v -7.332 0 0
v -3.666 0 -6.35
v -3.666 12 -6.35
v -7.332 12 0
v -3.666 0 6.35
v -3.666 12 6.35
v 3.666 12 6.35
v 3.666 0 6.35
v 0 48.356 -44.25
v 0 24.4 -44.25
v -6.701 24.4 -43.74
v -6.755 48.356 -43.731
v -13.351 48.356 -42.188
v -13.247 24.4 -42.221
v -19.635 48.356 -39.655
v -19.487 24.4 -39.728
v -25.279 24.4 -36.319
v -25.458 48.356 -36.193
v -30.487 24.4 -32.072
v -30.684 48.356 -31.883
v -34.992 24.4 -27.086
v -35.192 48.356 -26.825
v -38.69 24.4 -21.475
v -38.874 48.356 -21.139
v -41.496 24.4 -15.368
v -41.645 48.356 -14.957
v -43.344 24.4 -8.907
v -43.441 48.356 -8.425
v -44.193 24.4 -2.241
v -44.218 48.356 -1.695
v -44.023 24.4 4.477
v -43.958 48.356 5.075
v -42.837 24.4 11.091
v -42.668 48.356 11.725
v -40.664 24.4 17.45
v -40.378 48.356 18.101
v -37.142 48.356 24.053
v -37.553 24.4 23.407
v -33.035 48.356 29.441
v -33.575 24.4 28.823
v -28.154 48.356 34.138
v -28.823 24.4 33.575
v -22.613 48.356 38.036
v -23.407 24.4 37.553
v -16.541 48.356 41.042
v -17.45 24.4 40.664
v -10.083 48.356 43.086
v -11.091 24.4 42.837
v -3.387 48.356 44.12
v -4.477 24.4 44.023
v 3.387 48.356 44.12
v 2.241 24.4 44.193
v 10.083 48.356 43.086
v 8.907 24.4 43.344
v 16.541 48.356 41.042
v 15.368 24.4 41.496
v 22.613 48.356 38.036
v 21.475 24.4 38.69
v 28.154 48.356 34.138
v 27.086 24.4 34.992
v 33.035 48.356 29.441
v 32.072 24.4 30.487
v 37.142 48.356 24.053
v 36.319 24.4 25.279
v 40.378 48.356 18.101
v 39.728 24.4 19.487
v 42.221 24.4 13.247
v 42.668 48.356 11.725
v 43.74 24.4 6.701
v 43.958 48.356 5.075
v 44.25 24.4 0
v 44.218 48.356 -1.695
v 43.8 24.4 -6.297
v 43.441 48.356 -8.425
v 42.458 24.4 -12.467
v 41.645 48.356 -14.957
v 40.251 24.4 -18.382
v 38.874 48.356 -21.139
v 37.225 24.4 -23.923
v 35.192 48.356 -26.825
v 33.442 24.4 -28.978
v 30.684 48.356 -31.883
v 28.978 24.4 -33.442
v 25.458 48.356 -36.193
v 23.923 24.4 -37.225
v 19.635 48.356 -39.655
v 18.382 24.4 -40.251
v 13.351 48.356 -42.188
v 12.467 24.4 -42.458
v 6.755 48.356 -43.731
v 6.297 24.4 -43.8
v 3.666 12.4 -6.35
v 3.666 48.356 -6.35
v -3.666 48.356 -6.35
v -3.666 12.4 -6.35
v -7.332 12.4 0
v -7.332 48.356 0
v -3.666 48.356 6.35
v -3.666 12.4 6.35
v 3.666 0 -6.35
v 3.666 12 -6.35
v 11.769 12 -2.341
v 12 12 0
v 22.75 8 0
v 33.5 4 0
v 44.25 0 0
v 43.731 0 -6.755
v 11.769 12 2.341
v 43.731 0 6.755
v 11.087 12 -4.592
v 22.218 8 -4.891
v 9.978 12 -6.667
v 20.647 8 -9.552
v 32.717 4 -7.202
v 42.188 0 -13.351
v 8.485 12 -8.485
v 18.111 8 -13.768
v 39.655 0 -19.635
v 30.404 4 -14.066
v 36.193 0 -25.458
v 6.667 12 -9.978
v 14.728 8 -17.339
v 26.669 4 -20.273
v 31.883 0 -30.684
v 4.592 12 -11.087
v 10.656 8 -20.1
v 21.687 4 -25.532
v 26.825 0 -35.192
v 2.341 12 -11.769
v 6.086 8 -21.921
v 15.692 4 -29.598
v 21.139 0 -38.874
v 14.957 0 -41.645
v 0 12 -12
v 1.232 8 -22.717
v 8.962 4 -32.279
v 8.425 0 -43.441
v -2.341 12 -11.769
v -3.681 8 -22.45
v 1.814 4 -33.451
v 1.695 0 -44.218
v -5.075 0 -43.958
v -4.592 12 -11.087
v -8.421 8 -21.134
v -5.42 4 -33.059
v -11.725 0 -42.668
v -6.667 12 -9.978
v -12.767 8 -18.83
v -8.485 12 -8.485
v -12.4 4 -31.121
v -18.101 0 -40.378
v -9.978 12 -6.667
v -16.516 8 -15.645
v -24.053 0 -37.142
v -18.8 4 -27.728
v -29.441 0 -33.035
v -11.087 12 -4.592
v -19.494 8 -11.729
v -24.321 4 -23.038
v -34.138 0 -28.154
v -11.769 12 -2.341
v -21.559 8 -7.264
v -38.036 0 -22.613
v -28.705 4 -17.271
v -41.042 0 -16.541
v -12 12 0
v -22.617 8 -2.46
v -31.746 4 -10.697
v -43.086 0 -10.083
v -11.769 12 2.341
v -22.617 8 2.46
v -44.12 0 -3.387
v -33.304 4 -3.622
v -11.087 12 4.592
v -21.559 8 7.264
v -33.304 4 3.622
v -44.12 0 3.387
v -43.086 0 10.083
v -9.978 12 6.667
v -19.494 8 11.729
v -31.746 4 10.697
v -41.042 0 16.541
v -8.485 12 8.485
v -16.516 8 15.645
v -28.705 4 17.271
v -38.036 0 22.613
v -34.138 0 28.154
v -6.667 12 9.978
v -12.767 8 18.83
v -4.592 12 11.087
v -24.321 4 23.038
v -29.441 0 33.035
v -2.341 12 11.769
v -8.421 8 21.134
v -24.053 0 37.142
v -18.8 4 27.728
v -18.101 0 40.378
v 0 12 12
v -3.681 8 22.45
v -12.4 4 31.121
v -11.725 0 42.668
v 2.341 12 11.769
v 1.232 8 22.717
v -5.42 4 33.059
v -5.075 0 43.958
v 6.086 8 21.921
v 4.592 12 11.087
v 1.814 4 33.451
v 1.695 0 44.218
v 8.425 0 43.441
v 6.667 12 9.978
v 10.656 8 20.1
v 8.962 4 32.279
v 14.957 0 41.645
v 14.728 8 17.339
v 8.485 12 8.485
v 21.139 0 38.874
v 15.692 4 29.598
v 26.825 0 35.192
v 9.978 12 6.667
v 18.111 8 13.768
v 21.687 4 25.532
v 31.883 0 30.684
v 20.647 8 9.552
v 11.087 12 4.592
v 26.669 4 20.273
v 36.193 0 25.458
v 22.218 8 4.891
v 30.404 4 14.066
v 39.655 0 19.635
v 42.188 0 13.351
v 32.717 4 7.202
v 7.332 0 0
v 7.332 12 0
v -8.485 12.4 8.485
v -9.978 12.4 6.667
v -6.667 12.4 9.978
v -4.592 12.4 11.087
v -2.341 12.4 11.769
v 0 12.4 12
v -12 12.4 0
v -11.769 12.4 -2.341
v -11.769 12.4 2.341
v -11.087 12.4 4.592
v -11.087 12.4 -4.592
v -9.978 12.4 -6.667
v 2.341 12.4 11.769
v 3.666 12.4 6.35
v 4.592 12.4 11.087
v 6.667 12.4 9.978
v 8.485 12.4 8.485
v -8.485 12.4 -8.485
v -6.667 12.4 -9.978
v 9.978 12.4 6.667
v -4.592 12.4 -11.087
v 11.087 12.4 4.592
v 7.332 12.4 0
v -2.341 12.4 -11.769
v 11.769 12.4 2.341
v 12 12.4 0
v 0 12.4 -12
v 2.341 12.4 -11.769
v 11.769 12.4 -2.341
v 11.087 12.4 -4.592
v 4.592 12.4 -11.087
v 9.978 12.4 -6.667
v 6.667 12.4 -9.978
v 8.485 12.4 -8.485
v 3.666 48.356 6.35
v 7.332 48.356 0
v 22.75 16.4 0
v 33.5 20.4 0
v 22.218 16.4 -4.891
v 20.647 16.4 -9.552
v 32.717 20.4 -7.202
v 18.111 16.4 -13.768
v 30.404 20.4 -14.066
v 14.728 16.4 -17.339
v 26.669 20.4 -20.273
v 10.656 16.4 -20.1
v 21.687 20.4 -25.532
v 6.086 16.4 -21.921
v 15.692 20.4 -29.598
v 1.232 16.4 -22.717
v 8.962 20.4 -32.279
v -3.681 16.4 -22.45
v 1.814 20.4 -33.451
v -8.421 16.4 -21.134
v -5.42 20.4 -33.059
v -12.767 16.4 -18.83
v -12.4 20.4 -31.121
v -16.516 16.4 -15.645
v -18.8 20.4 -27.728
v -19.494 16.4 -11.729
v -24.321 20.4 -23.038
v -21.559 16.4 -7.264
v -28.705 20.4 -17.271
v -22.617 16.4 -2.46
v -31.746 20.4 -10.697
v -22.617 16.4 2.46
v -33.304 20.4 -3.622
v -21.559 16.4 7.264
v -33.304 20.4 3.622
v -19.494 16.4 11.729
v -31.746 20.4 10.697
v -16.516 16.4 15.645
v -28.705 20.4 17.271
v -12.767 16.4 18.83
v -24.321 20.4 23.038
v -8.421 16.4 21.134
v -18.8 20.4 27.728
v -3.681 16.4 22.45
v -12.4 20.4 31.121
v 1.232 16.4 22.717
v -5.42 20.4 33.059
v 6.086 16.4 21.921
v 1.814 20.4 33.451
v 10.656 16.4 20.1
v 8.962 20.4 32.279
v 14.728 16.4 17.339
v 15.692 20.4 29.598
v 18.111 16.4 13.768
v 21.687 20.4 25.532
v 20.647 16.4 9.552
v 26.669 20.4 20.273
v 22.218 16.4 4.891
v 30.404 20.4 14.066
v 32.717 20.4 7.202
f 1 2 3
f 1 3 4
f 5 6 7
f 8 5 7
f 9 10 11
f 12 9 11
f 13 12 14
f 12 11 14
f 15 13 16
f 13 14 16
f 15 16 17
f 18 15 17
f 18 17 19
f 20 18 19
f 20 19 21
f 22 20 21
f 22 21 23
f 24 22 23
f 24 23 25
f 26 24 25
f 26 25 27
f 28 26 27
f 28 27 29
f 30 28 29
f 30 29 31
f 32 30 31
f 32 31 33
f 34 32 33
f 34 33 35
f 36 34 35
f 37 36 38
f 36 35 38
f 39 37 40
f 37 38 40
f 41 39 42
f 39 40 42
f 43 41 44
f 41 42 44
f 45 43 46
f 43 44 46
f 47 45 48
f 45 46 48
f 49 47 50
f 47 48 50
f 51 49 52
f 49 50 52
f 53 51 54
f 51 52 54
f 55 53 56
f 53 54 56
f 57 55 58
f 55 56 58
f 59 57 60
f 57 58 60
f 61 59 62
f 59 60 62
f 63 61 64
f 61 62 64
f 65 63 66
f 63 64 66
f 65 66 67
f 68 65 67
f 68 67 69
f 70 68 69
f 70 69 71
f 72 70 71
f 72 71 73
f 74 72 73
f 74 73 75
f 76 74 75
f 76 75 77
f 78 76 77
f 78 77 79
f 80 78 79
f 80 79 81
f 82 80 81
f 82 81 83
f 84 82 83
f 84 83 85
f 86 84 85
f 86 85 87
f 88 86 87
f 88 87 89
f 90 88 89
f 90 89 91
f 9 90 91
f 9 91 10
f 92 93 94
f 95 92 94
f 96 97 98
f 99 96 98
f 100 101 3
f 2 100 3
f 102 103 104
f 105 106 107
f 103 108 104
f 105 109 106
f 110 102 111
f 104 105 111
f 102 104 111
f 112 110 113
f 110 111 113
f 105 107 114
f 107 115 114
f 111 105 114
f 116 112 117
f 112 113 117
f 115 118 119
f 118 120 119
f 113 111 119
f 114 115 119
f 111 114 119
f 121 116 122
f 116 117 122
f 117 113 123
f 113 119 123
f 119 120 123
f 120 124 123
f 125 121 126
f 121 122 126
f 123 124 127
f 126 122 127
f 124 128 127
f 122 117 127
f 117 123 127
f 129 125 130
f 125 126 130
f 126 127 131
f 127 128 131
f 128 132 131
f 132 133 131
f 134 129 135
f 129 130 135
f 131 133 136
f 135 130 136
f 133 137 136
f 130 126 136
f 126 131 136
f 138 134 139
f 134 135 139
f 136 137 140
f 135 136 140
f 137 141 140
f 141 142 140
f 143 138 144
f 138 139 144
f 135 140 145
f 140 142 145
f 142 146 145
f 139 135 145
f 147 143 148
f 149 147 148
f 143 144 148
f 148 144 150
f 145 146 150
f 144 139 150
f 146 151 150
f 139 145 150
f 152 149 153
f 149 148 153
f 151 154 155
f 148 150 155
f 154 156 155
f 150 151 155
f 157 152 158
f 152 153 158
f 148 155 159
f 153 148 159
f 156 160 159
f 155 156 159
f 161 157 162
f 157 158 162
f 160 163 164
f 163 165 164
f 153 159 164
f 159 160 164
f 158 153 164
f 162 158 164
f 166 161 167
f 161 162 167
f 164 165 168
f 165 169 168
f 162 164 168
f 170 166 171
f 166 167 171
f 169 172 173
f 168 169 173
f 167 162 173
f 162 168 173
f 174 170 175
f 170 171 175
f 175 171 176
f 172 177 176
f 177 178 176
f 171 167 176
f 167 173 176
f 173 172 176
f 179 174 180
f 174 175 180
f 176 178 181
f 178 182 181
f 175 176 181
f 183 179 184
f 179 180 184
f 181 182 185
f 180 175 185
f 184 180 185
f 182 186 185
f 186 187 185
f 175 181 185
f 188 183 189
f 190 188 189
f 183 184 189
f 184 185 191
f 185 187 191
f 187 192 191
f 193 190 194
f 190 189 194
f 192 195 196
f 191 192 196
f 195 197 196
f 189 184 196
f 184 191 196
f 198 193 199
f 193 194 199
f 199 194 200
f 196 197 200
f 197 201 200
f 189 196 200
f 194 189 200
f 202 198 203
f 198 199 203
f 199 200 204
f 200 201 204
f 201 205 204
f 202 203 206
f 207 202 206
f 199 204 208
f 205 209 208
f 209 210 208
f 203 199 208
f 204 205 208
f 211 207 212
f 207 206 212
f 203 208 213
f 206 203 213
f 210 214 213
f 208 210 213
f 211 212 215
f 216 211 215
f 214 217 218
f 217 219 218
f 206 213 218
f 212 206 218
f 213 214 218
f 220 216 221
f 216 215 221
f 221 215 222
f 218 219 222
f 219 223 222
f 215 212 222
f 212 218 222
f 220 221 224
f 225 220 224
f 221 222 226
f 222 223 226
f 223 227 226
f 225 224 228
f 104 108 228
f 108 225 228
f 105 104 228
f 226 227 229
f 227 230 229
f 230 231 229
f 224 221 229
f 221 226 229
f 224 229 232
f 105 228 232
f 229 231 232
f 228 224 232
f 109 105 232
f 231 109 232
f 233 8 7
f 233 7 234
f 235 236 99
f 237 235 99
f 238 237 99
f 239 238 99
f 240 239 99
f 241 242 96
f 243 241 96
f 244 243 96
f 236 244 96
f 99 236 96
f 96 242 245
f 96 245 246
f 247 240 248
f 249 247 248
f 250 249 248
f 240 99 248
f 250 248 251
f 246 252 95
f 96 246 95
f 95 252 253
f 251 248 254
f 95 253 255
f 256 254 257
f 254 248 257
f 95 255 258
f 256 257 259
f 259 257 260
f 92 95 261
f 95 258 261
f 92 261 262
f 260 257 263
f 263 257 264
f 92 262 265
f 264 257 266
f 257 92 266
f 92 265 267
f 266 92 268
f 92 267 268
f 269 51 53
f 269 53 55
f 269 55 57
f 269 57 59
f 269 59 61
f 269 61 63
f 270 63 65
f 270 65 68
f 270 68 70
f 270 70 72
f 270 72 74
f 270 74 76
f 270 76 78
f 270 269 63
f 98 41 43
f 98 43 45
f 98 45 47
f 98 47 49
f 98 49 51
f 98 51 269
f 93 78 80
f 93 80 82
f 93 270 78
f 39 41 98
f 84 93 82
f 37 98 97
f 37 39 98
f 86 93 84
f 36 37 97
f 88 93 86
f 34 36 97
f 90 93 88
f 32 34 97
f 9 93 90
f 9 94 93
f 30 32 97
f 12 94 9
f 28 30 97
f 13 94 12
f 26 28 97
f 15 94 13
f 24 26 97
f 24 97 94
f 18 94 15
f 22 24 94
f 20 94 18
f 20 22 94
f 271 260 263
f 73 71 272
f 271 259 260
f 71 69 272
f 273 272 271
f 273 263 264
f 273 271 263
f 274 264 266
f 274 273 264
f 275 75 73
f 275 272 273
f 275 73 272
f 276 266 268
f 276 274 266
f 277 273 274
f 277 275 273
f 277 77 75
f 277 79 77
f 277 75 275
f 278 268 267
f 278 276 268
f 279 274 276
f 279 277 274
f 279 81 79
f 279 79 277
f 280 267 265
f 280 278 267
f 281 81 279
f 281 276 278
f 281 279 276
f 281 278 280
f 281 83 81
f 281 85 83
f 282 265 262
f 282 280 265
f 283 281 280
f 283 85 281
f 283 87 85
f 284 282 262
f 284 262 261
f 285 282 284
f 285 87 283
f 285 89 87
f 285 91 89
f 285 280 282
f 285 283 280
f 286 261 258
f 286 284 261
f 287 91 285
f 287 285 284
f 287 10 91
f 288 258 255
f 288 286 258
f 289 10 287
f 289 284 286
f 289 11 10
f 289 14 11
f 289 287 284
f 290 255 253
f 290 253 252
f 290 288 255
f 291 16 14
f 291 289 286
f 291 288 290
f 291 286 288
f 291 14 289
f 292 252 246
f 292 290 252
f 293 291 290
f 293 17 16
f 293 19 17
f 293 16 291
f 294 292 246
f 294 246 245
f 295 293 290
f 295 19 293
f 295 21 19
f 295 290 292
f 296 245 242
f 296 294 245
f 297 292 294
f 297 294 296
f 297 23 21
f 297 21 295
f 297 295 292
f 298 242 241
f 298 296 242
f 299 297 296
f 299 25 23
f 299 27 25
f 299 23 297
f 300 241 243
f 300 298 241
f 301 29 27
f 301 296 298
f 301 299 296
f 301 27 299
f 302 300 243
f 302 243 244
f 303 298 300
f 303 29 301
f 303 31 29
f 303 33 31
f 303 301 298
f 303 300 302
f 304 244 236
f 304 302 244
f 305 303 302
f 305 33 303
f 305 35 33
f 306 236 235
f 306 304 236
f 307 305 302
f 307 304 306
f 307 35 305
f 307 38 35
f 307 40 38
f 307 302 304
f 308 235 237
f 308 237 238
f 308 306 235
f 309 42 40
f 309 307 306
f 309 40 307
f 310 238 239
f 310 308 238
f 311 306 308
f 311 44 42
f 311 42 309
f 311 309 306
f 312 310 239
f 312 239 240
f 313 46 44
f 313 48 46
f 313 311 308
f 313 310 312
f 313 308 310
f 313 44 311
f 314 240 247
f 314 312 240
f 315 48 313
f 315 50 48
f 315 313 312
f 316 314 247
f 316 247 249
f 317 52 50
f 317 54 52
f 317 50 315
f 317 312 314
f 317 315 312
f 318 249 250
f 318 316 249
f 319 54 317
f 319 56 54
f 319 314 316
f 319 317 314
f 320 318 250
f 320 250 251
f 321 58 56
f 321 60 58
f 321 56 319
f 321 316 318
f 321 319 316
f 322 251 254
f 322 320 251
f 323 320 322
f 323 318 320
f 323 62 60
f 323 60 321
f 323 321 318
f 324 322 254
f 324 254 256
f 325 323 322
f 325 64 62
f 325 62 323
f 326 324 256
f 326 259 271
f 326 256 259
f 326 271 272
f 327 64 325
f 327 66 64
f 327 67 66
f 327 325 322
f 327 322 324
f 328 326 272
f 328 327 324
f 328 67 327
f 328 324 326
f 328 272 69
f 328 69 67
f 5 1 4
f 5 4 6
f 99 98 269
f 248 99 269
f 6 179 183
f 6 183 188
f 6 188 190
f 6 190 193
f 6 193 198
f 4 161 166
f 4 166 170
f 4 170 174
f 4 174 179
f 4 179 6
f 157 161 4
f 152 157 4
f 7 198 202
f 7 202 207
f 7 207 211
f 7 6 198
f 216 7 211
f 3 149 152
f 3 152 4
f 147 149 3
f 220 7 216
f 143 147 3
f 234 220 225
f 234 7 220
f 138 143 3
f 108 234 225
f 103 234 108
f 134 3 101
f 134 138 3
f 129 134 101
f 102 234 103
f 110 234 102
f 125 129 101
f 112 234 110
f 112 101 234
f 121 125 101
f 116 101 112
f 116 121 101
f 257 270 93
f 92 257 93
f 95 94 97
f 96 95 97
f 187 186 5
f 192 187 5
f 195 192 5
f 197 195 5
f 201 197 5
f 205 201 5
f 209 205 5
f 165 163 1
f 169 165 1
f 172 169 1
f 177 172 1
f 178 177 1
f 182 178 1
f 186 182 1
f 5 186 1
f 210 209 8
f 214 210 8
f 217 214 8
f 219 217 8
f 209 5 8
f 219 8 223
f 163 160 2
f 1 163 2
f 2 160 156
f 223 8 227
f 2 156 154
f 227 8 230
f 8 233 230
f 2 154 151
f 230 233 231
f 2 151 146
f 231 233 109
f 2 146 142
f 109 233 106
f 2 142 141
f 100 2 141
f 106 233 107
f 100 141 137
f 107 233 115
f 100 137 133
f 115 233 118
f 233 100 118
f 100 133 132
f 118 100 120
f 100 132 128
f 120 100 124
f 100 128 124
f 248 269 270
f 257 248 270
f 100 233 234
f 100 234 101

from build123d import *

# Parameters (mm, degrees)
SKETCH2_R           = 12
SKETCH1_R           = 44.25
SKETCH6_R           = 44.25
BOSS_EXTRUDE1_DEPTH = 23.956000094
CUT_EXTRUDE1_DEPTH  = 80.08494037


with BuildPart() as part:
    # Sketch2 → Loft1 section 0
    with BuildSketch(Plane(origin=(0, 12, 0), x_dir=(1, 0, 0), z_dir=(0, 1, 0))):
        Circle(SKETCH2_R)
    # Sketch1 → Loft1 section 1
    with BuildSketch(Plane(origin=(0, 0, 0), x_dir=(1, 0, 0), z_dir=(0, 1, 0))):
        Circle(SKETCH1_R)
    loft()


with BuildPart() as body_2:
    # Mirror2: mirrored copy
    add(part.part.mirror(Plane.ZX.offset(12.200000108)))

    # Sketch6 → Boss-Extrude1 (add)
    with BuildSketch(Plane(origin=(0, 24.400000216, 0), x_dir=(1, 0, 0), z_dir=(0, 1, 0))):
        with Locations(Location((0, 0, 0), (0, 0, 90))):
            Circle(SKETCH6_R)
    extrude(amount=BOSS_EXTRUDE1_DEPTH)


with BuildPart() as cut_extrude1_tool:
    # Sketch7 → Cut-Extrude1 (new, through all)
    with BuildSketch(Plane(origin=(0, 48.35600031, 0), x_dir=(1, 0, 0), z_dir=(0, 1, 0))):
        Polygon((7.332348419, 0), (3.666174209, 6.35), (-3.666174209, 6.35), (-7.332348419, 0), (-3.666174209, -6.35), (3.666174209, -6.35), align=None)
    extrude(amount=-CUT_EXTRUDE1_DEPTH)


with BuildPart() as part_1:
    add(part.part)

    # Cut-Extrude1: cut by cut_extrude1_tool
    add(cut_extrude1_tool.part, mode=Mode.SUBTRACT)


with BuildPart() as body_2_1:
    add(body_2.part)

    # Cut-Extrude1: cut by cut_extrude1_tool
    add(cut_extrude1_tool.part, mode=Mode.SUBTRACT)


solid = Compound([part_1.part, body_2_1.part])
